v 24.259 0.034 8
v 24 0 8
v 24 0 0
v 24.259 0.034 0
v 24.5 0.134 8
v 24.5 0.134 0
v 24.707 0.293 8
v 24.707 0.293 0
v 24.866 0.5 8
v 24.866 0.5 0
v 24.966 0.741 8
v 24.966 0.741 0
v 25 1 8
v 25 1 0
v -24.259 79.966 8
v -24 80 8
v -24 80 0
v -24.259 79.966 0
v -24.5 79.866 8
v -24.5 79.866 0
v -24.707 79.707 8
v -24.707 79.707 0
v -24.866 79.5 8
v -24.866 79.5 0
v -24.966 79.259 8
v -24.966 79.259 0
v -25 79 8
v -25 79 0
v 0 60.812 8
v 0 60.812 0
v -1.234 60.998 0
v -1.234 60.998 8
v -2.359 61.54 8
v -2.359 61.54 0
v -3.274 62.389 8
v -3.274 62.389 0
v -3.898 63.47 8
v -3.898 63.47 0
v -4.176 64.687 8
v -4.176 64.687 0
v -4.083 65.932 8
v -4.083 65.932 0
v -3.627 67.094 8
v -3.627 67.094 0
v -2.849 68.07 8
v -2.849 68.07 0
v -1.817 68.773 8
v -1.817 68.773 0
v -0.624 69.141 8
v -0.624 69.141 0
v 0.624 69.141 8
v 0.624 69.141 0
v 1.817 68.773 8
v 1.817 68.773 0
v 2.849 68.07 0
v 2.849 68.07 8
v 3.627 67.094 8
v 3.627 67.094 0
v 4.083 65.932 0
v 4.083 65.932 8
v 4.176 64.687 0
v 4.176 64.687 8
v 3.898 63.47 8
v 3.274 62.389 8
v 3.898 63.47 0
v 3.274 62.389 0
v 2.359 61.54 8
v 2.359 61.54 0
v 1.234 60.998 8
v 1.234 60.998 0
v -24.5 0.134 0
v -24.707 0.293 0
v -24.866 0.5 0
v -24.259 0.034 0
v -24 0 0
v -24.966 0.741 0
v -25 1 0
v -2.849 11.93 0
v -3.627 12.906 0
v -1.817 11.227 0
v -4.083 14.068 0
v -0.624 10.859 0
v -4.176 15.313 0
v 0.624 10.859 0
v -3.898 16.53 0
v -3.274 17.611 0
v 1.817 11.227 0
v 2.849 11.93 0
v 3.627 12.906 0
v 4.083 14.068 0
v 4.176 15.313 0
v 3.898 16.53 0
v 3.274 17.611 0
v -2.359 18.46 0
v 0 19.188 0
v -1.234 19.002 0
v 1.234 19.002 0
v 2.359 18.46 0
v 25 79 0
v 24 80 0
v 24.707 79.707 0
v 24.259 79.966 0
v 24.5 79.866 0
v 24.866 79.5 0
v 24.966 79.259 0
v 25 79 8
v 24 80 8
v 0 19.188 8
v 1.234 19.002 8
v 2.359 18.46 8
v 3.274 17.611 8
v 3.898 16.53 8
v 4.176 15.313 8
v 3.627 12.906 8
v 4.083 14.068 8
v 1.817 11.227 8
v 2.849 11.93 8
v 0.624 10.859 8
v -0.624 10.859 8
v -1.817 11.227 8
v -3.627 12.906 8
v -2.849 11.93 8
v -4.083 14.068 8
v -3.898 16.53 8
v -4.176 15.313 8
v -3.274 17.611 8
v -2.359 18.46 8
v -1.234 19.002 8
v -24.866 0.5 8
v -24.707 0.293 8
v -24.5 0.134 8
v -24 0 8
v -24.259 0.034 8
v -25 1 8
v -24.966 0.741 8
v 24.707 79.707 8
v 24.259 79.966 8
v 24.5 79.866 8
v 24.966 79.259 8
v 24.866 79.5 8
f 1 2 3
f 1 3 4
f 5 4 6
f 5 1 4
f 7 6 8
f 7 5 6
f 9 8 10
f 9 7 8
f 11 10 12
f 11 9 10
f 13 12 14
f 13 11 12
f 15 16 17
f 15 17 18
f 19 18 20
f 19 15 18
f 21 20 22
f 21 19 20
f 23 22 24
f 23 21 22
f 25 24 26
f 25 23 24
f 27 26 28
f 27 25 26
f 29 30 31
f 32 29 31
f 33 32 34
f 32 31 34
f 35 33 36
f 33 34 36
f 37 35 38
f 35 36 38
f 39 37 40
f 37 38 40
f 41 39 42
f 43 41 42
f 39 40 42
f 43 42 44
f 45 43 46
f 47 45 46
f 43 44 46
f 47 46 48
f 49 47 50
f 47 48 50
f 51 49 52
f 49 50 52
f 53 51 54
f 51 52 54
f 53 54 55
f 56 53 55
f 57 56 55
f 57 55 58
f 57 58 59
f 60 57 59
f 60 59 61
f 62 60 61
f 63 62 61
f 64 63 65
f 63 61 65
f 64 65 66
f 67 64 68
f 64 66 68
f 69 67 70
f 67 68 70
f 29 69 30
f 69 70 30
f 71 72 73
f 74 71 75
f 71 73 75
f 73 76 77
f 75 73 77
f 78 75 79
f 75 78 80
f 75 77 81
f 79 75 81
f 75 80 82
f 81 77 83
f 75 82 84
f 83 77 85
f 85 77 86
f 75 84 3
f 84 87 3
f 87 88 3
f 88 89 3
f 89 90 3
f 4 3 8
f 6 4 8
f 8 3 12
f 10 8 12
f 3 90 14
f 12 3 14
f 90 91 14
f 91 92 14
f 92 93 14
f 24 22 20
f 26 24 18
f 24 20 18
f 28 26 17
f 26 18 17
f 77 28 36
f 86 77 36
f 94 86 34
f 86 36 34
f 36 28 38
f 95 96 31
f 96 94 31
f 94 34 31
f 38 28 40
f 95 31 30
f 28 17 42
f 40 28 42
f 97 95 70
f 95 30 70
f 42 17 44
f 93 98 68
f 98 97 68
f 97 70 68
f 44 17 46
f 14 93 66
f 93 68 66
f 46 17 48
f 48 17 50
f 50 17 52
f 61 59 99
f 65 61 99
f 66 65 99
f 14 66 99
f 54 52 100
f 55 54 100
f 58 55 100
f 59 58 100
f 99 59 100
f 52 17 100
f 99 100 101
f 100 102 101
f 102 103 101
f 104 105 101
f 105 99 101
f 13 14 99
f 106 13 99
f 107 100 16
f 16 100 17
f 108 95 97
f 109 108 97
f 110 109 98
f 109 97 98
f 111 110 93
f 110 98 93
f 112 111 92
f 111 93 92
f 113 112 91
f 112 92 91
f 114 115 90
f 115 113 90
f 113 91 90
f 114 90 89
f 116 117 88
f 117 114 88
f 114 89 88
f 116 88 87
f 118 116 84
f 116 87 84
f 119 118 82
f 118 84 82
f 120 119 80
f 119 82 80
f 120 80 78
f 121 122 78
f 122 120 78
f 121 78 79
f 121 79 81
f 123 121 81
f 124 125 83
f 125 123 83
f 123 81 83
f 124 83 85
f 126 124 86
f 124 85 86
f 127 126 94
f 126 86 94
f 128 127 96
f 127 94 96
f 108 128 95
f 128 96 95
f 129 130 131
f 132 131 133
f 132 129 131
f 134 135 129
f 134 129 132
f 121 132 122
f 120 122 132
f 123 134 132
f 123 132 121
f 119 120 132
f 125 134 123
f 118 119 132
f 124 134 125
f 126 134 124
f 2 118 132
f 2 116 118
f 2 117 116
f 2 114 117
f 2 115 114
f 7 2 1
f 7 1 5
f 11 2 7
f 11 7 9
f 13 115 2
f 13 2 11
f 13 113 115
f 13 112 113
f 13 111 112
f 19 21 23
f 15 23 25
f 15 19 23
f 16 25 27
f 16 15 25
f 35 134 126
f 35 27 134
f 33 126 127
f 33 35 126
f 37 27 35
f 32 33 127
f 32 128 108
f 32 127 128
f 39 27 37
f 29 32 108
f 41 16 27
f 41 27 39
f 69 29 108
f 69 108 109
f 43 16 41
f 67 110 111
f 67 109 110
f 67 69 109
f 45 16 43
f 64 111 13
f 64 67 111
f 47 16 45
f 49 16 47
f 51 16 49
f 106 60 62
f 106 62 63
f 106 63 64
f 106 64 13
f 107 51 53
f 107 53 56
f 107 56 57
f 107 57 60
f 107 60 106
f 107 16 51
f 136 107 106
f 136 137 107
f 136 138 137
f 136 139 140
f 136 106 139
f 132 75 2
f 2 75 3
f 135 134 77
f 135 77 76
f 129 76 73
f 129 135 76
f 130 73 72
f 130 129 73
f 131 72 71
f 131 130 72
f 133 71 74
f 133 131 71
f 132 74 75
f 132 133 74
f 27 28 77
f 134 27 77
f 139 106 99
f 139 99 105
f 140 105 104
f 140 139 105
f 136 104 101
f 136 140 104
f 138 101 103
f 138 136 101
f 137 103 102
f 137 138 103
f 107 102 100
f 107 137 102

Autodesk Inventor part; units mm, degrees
ref_plane "YZ Plane" through (0, 0, 0) normal (1, 0, 0) x (0, 1, 0)
ref_plane "XZ Plane" through (0, 0, 0) normal (0, 1, 0) x (-1, 0, 0)
sketch "Sketch1" plane through (0, 0, 0) normal (0, 0, 1) x (1, 0, 0)
  line L0 (-25, 0) -> (25, 0)
  line L1 (25, 0) -> (25, 80)
  line L2 (25, 80) -> (-25, 80)
  line L3 (-25, 80) -> (-25, 0)
  point P0 (0, 0)
  point P1 (0, 0)
  dimension "d2" = 80
  dimension "d3" = 50
extrude "Plate1" add sketch "Sketch1" along normal blind 8
hole "Hole1" at (0, 65, 8) direction (0, 0, -1) diameter 8.376 depth 8 tip angle 118 thread size "M10x1.5" class "6H" standard "ISO Metric profile"
ref_plane "Work Plane1" through (0, 0, 8) normal (-1, 0, 0) x (0, 0, 1)
ref_plane "Work Plane2" through (-25, 40, 8) normal (0, -1, 0) x (1, 0, 0)
mirror "Mirror1" about plane through (-25, 40, 8) normal (0, -1, 0) of "Hole1"
fillet "Corner Round1" radius 1 4 edges at (-25, 0, 4) (25, 0, 4) (-25, 80, 4) (25, 80, 4)
equation "\"d12\" = Thickness"
equation "\"BendReliefWidth\" = Thickness"
equation "\"CornerReliefSize\" = 4 * Thickness"
equation "\"MinimumRemnant\" = 2 * Thickness"
equation "\"TransitionRadius\" = BendRadius"
equation "\"d4\" = BendRadius"
equation "\"JacobiRadiusSize\" = Thickness"
equation "\"GapSize\" = Thickness"
equation "\"Thickness\" = 8"
equation "\"BendRadius\" = 0.001"
properties part number "draadlat poot" material "Steel, Mild"
